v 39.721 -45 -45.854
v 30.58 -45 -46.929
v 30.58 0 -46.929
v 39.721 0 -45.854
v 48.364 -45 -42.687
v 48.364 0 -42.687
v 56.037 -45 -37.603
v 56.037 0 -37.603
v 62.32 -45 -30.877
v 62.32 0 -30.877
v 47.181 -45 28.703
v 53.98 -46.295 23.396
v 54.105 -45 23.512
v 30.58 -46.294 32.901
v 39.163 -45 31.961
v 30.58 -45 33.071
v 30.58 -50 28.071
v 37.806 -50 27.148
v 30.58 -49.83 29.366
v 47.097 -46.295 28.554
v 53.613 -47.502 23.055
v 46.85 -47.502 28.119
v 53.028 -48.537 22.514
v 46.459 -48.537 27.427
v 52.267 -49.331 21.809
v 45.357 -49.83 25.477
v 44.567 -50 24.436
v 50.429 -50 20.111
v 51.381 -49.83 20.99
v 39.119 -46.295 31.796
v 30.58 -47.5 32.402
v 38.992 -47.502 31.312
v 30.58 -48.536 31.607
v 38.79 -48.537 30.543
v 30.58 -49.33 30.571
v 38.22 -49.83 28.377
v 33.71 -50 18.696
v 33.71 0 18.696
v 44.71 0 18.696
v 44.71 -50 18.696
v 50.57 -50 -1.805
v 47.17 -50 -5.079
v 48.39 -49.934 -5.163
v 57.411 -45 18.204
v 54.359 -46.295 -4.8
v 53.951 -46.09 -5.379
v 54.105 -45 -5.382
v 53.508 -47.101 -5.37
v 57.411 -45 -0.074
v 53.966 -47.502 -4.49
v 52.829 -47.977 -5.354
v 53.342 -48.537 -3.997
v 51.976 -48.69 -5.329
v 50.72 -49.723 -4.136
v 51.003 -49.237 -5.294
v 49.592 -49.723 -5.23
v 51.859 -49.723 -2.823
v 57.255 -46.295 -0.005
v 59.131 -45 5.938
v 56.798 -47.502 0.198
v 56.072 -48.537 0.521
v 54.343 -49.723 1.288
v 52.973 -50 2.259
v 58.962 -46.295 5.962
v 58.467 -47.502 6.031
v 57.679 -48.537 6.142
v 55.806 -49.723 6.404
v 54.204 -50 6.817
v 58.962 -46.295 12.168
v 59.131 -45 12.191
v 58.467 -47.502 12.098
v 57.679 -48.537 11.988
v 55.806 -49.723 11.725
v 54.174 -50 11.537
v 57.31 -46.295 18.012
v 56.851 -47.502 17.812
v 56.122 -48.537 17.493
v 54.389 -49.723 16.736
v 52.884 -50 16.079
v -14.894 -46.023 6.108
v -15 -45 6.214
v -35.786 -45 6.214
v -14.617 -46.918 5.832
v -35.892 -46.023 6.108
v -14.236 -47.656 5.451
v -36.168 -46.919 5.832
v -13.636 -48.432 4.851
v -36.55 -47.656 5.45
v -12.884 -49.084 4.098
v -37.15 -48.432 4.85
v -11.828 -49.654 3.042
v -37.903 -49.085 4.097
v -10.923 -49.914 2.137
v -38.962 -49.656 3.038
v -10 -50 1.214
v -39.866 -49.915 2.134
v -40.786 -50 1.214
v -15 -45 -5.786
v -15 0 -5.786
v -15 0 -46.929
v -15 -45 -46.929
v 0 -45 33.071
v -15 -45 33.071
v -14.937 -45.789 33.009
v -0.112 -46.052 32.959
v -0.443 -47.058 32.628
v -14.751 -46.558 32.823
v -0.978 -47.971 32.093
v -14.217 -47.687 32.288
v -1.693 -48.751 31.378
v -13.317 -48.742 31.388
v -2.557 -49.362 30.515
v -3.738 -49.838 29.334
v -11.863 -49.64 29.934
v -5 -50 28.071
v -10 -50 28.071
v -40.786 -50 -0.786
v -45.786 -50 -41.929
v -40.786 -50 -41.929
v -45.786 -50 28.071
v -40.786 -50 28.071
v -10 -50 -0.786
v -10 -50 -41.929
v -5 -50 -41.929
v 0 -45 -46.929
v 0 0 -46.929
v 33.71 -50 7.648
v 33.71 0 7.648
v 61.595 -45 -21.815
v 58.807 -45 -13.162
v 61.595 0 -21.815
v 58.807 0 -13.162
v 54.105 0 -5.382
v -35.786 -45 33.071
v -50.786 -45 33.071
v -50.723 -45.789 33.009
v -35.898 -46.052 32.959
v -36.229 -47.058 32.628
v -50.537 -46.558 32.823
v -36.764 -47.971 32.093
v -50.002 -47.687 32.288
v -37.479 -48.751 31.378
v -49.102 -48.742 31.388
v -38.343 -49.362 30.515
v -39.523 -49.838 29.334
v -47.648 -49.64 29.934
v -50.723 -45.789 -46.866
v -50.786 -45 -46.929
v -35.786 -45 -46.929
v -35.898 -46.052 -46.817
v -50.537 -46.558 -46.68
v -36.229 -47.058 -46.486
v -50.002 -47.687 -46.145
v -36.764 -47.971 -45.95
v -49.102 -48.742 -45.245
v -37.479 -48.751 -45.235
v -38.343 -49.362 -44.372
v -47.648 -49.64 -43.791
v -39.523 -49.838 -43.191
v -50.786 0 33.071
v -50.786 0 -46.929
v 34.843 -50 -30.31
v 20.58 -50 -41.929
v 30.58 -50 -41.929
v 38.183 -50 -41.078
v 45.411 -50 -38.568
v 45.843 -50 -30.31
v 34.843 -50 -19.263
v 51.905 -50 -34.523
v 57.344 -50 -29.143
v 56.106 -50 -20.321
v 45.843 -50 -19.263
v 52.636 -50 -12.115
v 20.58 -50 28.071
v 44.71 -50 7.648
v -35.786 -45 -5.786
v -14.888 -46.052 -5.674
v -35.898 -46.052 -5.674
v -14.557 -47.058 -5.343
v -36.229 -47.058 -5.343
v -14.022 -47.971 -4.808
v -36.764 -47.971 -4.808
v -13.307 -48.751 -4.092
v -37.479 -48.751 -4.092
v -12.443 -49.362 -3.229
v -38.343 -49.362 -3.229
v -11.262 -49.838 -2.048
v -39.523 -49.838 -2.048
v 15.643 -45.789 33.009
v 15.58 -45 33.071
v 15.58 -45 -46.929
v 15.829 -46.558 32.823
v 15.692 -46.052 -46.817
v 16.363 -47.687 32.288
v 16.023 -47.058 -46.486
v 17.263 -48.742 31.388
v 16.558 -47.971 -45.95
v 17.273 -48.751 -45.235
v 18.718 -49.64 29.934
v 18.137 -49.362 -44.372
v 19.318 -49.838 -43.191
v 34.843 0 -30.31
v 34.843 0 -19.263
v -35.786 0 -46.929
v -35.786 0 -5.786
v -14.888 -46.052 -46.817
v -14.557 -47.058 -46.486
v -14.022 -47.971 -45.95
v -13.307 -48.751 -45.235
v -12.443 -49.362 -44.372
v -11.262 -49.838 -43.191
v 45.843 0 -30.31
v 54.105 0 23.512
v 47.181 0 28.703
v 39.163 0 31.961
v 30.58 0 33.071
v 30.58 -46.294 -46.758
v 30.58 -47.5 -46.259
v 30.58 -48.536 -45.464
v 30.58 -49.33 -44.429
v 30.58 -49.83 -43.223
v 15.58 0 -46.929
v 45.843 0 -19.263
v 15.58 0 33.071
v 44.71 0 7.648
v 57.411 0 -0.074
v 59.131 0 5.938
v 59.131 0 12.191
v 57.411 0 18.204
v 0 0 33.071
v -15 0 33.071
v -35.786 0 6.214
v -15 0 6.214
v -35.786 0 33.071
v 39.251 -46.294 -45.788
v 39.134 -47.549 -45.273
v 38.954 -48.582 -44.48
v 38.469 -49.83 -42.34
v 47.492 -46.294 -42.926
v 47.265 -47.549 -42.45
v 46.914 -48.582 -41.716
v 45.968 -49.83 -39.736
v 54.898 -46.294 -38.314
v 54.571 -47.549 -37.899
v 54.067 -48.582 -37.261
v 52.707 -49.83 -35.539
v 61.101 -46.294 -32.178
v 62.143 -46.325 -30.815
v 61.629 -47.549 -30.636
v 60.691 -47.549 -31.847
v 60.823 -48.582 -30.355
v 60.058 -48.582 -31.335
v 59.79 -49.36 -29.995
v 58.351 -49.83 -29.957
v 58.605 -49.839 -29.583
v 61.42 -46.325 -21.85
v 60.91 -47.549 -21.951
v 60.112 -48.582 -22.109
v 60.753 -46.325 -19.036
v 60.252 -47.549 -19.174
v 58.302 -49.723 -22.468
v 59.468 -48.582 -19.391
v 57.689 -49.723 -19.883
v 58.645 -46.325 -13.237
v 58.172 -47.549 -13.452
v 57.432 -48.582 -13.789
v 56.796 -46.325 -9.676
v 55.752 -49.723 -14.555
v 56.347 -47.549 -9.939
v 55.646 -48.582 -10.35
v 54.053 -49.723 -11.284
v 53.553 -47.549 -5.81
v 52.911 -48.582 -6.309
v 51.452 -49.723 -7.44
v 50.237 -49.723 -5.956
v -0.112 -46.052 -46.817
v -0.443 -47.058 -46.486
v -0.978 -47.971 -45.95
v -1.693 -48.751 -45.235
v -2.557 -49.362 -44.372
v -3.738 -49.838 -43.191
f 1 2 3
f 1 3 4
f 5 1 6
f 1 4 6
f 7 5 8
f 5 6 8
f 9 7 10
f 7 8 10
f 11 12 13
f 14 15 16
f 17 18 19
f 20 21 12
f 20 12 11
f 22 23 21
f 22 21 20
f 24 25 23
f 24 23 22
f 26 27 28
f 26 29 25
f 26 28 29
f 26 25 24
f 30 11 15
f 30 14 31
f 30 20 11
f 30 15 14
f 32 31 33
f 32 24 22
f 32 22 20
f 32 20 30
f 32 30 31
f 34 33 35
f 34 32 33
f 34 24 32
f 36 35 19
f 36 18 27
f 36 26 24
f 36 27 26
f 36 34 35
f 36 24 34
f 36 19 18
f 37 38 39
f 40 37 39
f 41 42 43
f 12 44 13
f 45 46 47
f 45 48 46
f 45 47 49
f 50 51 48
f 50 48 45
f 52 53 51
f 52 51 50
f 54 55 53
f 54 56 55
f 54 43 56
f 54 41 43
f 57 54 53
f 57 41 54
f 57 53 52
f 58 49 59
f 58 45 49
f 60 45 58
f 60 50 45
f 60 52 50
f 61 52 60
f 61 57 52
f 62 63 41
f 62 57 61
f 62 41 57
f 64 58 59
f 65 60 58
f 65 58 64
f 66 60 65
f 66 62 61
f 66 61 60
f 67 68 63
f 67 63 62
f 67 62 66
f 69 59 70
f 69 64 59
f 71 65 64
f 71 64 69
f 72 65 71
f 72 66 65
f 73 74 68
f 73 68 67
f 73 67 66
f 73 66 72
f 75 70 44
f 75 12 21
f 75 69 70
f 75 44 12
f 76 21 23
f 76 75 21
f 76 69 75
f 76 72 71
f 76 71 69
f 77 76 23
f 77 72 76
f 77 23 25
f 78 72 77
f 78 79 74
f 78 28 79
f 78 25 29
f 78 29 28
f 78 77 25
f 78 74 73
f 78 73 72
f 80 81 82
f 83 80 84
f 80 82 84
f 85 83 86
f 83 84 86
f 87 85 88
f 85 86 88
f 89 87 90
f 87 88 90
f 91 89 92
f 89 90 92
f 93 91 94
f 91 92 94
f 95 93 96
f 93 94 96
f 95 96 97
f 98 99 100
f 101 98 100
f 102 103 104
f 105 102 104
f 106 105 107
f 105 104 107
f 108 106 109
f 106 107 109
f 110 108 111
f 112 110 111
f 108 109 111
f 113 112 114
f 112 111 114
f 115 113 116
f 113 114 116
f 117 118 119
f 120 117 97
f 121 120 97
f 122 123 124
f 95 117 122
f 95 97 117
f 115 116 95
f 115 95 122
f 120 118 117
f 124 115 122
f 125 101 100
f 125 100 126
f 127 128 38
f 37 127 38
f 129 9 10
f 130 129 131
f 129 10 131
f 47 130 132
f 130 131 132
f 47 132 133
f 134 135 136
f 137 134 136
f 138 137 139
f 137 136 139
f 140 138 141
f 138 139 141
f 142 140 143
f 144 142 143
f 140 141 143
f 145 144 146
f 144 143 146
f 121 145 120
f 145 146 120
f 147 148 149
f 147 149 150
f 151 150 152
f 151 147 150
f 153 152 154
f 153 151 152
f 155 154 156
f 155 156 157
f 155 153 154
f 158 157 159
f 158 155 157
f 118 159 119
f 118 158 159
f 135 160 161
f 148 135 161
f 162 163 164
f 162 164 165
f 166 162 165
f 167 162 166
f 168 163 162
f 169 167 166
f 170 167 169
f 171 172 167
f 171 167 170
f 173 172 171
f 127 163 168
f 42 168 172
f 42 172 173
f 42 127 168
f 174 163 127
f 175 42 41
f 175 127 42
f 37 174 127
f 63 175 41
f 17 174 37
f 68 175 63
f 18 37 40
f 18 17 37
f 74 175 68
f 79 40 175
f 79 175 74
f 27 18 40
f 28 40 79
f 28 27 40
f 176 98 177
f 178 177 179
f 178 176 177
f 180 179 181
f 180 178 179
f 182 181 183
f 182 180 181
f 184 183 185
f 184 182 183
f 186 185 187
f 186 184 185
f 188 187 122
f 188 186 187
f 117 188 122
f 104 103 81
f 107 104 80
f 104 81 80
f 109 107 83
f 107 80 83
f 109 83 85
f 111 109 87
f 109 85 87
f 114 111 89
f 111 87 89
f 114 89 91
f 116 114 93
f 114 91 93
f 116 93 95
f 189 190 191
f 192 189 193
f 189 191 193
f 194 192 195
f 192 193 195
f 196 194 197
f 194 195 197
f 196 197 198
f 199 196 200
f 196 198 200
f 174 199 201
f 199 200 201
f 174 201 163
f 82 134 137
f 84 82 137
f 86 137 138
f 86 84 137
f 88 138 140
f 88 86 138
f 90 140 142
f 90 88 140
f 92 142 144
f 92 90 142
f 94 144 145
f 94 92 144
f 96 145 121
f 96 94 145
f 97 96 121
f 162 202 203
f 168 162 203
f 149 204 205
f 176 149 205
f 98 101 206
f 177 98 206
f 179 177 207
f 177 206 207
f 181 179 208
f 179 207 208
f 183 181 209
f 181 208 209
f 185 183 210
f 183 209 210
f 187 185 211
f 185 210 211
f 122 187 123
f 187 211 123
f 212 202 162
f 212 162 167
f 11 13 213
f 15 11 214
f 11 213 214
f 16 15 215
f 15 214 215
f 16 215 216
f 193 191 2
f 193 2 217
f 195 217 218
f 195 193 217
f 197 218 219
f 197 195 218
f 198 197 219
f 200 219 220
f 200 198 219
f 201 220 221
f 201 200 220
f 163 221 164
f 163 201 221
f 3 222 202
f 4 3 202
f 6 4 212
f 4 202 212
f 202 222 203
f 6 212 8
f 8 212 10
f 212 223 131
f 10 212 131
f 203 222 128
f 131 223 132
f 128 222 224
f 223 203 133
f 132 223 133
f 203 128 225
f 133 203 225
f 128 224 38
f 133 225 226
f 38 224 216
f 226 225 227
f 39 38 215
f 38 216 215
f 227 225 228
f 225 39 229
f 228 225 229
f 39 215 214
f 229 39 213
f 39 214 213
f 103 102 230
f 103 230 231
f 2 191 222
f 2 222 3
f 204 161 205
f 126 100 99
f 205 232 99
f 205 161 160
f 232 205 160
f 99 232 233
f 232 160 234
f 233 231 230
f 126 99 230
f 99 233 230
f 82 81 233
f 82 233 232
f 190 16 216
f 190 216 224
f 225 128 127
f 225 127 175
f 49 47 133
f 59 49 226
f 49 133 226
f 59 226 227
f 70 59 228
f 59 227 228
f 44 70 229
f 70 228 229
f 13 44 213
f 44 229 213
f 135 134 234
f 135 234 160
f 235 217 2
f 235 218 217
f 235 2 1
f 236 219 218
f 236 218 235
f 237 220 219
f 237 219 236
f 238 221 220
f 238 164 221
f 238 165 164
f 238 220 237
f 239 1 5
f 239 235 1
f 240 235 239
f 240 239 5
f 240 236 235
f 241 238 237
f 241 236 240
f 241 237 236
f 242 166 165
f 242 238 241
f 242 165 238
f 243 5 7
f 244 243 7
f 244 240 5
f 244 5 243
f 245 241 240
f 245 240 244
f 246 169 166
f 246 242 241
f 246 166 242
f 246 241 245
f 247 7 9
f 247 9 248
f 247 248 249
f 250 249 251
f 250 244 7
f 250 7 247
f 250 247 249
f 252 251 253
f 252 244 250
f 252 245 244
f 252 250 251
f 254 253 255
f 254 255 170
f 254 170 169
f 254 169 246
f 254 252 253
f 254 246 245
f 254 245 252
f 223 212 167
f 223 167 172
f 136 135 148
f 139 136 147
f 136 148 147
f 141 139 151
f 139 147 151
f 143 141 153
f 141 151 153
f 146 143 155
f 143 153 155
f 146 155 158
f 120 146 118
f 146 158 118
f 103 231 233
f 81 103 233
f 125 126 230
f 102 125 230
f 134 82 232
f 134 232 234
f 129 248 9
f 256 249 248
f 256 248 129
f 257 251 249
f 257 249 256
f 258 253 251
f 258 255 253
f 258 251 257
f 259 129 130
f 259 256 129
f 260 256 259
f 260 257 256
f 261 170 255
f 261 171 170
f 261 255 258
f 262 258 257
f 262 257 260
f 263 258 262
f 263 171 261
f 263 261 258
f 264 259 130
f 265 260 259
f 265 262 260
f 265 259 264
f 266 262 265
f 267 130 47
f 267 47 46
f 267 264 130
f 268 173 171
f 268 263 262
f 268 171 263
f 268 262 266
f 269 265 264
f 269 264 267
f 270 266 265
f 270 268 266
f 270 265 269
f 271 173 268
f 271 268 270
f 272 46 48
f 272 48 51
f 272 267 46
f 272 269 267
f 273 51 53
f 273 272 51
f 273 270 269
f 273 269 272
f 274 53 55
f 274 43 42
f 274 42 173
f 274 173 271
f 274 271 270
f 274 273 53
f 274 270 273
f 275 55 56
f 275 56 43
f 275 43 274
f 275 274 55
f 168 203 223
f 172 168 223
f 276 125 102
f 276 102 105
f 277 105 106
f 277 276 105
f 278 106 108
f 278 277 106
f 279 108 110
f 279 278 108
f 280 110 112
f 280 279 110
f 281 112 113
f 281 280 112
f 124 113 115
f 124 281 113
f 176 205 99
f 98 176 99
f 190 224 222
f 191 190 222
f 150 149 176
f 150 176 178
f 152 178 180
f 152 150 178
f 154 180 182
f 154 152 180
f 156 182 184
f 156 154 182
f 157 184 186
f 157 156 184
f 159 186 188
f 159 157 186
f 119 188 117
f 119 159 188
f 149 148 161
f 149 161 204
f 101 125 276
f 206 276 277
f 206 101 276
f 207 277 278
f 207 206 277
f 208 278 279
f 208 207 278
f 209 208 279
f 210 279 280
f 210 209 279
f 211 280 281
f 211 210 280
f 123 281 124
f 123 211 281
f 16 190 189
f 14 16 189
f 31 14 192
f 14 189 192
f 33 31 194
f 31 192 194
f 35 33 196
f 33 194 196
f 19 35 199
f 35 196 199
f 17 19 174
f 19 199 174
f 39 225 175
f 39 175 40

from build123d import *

# Parameters (mm, degrees)
F1_DEPTH       = 50
F0_W           = 11
F0_H           = 11.0476613045
F0_H_2         = 11.0476617701
F2_T1_DEPTH    = 105
F2_T3_DEPTH    = 40
F2_T5_DEPTH    = 39.3571444373
F2_T7_DEPTH    = 40
F2_T9_DEPTH    = 53.6428555627
F2_T11_DEPTH   = 20.7857115482
F2_T16_DEPTH   = 51.8571444373
F2_T21_DEPTH   = 66.1428555627
F2_T26_DEPTH   = 66.1428555627
F2_T31_DEPTH   = 51.8571444373
F2_T37_DEPTH   = 51.8571444373
F2_T42_DEPTH   = 33.2857115482
F2_T49_DEPTH   = 66.1428555627
F2_T54_DEPTH   = 33.2857115482
F2_T61_DEPTH   = 33.2857115482
F2_T65_DEPTH   = 66.1428555627
F2_T73_DEPTH   = 51.8571444373
F2_T78_DEPTH   = 33.2857115482
F2_2_T1_DEPTH  = 27.5
F2_2_T3_DEPTH  = 105
F2_2_T6_ANGLE  = 80.3342530923
F2_2_T10_ANGLE = 143.4118786012
F2_2_S11_R     = 39.2893999544
F2_2_T12_DEPTH = 27
F2_2_T16_ANGLE = 76.3206243735
F2_2_S17_R     = 22.5233307718
F2_2_T18_DEPTH = 29
F2_2_T20_ANGLE = 71.8308511896
F2_2_T25_ANGLE = 76.3206243735
F2_2_S26_R     = 22.5233307718
F2_2_T27_DEPTH = 29
F2_2_T30_ANGLE = 143.4118786012
F2_2_S31_R     = 39.2893999544
F2_2_T32_DEPTH = 27


# Not quite as in the source:
# - a fillet or chamfer that OpenCascade refuses, or shapes differently, is made with other operations: its cross-section is extruded or revolved along the edge and cut away or added


with BuildPart() as f1:
    # F0 (on Front) → F1 (new body)
    with BuildSketch(Plane.XZ):
        Polygon((-35.7857115482, 33.0714304233), (-50.7857115482, 33.0714304233), (-50.7857115482, -46.9285695767), (-35.7857115482, -46.9285695767), (-35.7857115482, -5.785714014), (-15, -5.785714014), (-15, -46.9285695767), (0, -46.9285695767), (0, 33.0714304233), (-15, 33.0714304233), (-15, 6.214285986), (-35.7857115482, 6.214285986), align=None)
    extrude(amount=F1_DEPTH)

    # F2: fillet of radius 5 on 12 edges, made by hand

    # F2_s2 → F2_t1 (cut)
    with BuildSketch(Plane.XY.offset(-59.4285695767)):
        with BuildLine():
            ThreePointArc((0, -45), (-1.4644660941, -48.5355339059), (-5, -50))
            Line((-5, -50), (0, -50))
            Line((0, -50), (0, -45))
        make_face()
        with BuildLine():
            ThreePointArc((-50.7857115482, -45), (-49.3212454541, -48.5355339059), (-45.7857115482, -50))
            Line((-45.7857115482, -50), (-50.7857115482, -50))
            Line((-50.7857115482, -50), (-50.7857115482, -45))
        make_face()
    extrude(amount=F2_T1_DEPTH, mode=Mode.SUBTRACT)

    # F2_s4 → F2_t3 (cut)
    with BuildSketch(Plane.YZ.offset(-27.5)):
        with BuildLine():
            ThreePointArc((-45, 33.0714304233), (-48.5355339059, 31.6069643292), (-50, 28.0714304233))
            Line((-50, 28.0714304233), (-50, 33.0714304233))
            Line((-50, 33.0714304233), (-45, 33.0714304233))
        make_face()
        with BuildLine():
            ThreePointArc((-45, -46.9285695767), (-48.5355339059, -45.4641034826), (-50, -41.9285695767))
            Line((-50, -41.9285695767), (-50, -46.9285695767))
            Line((-50, -46.9285695767), (-45, -46.9285695767))
        make_face()
    extrude(amount=F2_T3_DEPTH, mode=Mode.SUBTRACT)

    # F2_s6 → F2_t5 (cut)
    with BuildSketch(Plane.XY.offset(6.214285986)):
        with BuildLine():
            ThreePointArc((-35.7857115482, -45), (-37.2501776423, -48.5355339059), (-40.7857115482, -50))
            Line((-40.7857115482, -50), (-35.7857115482, -50))
            Line((-35.7857115482, -50), (-35.7857115482, -45))
        make_face()
        with BuildLine():
            ThreePointArc((-15, -45), (-13.5355339059, -48.5355339059), (-10, -50))
            Line((-10, -50), (-15, -50))
            Line((-15, -50), (-15, -45))
        make_face()
    extrude(amount=F2_T5_DEPTH, mode=Mode.SUBTRACT)

    # F2_s8 → F2_t7 (cut)
    with BuildSketch(Plane.YZ.offset(-63.2857115482)):
        with BuildLine():
            ThreePointArc((-45, 33.0714304233), (-48.5355339059, 31.6069643292), (-50, 28.0714304233))
            Line((-50, 28.0714304233), (-50, 33.0714304233))
            Line((-50, 33.0714304233), (-45, 33.0714304233))
        make_face()
        with BuildLine():
            ThreePointArc((-45, -46.9285695767), (-48.5355339059, -45.4641034826), (-50, -41.9285695767))
            Line((-50, -41.9285695767), (-50, -46.9285695767))
            Line((-50, -46.9285695767), (-45, -46.9285695767))
        make_face()
    extrude(amount=F2_T7_DEPTH, mode=Mode.SUBTRACT)

    # F2_s10 → F2_t9 (cut)
    with BuildSketch(Plane.XY.offset(-59.4285695767)):
        with BuildLine():
            ThreePointArc((-35.7857115482, -45), (-37.2501776423, -48.5355339059), (-40.7857115482, -50))
            Line((-40.7857115482, -50), (-35.7857115482, -50))
            Line((-35.7857115482, -50), (-35.7857115482, -45))
        make_face()
        with BuildLine():
            ThreePointArc((-15, -45), (-13.5355339059, -48.5355339059), (-10, -50))
            Line((-10, -50), (-15, -50))
            Line((-15, -50), (-15, -45))
        make_face()
    extrude(amount=F2_T9_DEPTH, mode=Mode.SUBTRACT)

    # F2_s12 → F2_t11 (cut)
    with BuildSketch(Plane.YZ.offset(-35.7857115482)):
        with BuildLine():
            ThreePointArc((-45, -5.785714014), (-48.5355339059, -4.3212479199), (-50, -0.785714014))
            Line((-50, -0.785714014), (-50, -5.785714014))
            Line((-50, -5.785714014), (-45, -5.785714014))
        make_face()
        with BuildLine():
            ThreePointArc((-45, 6.214285986), (-48.5355339059, 4.749819892), (-50, 1.214285986))
            Line((-50, 1.214285986), (-50, 6.214285986))
            Line((-50, 6.214285986), (-45, 6.214285986))
        make_face()
    extrude(amount=F2_T11_DEPTH, mode=Mode.SUBTRACT)


with BuildPart() as f1b:
    # F0 (on Front) → F1, piece 2 (new body)
    with BuildSketch(Plane.XZ):
        with BuildLine():
            Line((30.5800376087, 33.0714304233), (15.5800376087, 33.0714304233))
            Line((15.5800376087, 33.0714304233), (15.5800376087, -46.9285695767))
            Line((15.5800376087, -46.9285695767), (30.5800376087, -46.9285695767))
            ThreePointArc((30.5800376087, -46.9285695767), (48.3641167152, -42.6873971764), (62.3201467097, -30.8767985553))
            ThreePointArc((62.3201467097, -30.8767985553), (60.4523586567, -17.4078220357), (54.1052147746, -5.3821941838))
            ThreePointArc((54.1052147746, -5.3821941838), (59.3488970656, 9.0647493489), (54.1052147746, 23.5116928816))
            ThreePointArc((54.1052147746, 23.5116928816), (43.2767157427, 30.5902254056), (30.5800376087, 33.0714304233))
        make_face()
        with Locations((40.3426289856, -24.7864220291)):
            Rectangle(F0_W, F0_H, mode=Mode.SUBTRACT)
        with Locations((39.2095372379, 13.1722127553)):
            Rectangle(F0_W, F0_H_2, mode=Mode.SUBTRACT)
    extrude(amount=F1_DEPTH)

    # F2#2: fillet of radius 5 on 7 edges, made by hand

    # F2_2_s2 → F2_2_t1 (cut)
    with BuildSketch(Plane.YZ.offset(3.0800376087)):
        with BuildLine():
            ThreePointArc((-45, -46.9285695767), (-48.5355339059, -45.4641034826), (-50, -41.9285695767))
            Line((-50, -41.9285695767), (-50, -46.9285695767))
            Line((-50, -46.9285695767), (-45, -46.9285695767))
        make_face()
        with BuildLine():
            ThreePointArc((-45, 33.0714304233), (-48.5355339059, 31.6069643292), (-50, 28.0714304233))
            Line((-50, 28.0714304233), (-50, 33.0714304233))
            Line((-50, 33.0714304233), (-45, 33.0714304233))
        make_face()
    extrude(amount=F2_2_T1_DEPTH, mode=Mode.SUBTRACT)

    # F2_2_s4 → F2_2_t3 (cut)
    with BuildSketch(Plane.XY.offset(-59.4285695767)):
        with BuildLine():
            ThreePointArc((15.5800376087, -45), (17.0445037028, -48.5355339059), (20.5800376087, -50))
            Line((20.5800376087, -50), (15.5800376087, -50))
            Line((15.5800376087, -50), (15.5800376087, -45))
        make_face()
    extrude(amount=F2_2_T3_DEPTH, mode=Mode.SUBTRACT)

    # F2_2_s5 → F2_2_t6 (revolve, cut)
    with BuildSketch(Plane(origin=(0.9703990257, 0, -5.6975752164), x_dir=(0, 1, 0), z_dir=(0.1679000671, 0, -0.9858040208))):
        with BuildLine():
            ThreePointArc((-45, 63.7619837133), (-48.5355339059, 62.2975176192), (-50, 58.7619837133))
            Line((-50, 58.7619837133), (-50, 63.7619837133))
            Line((-50, 63.7619837133), (-45, 63.7619837133))
        make_face()
    revolve(axis=Axis((30.5800376087, -50, -0.6545238583), (0, -1, 0)), revolution_arc=F2_2_T6_ANGLE, mode=Mode.SUBTRACT)


with BuildPart() as f2_tool14:
    # F2_s15 → F2_t16 (new body)
    with BuildSketch(Plane.XY.offset(-6.285714014)):
        with BuildLine():
            ThreePointArc((-35.7857115482, -45), (-37.2501776423, -48.5355339059), (-40.7857115482, -50))
            Line((-40.7857115482, -50), (-35.7857115482, -50))
            Line((-35.7857115482, -50), (-35.7857115482, -45))
        make_face()
    extrude(amount=F2_T16_DEPTH)

    split(bisect_by=Plane.XY.offset(-5.785714014), keep=Keep.BOTTOM)


with BuildPart() as f1_1:
    add(f1.part)

    # F2_t13: cut F2_tool14
    add(f2_tool14.part, mode=Mode.SUBTRACT)


with BuildPart() as f2_tool19:
    # F2_s20 → F2_t21 (new body)
    with BuildSketch(Plane.XY.offset(-59.4285695767)):
        with BuildLine():
            ThreePointArc((-35.7857115482, -45), (-37.2501776423, -48.5355339059), (-40.7857115482, -50))
            Line((-40.7857115482, -50), (-35.7857115482, -50))
            Line((-35.7857115482, -50), (-35.7857115482, -45))
        make_face()
    extrude(amount=F2_T21_DEPTH)

    split(bisect_by=Plane.XY.offset(6.214285986), keep=Keep.TOP)


with BuildPart() as f1_2:
    add(f1_1.part)

    # F2_t18: cut F2_tool19
    add(f2_tool19.part, mode=Mode.SUBTRACT)


with BuildPart() as f2_tool24:
    # F2_s25 → F2_t26 (new body)
    with BuildSketch(Plane.XY.offset(6.714285986)):
        with BuildLine():
            ThreePointArc((-15, -45), (-13.5355339059, -48.5355339059), (-10, -50))
            Line((-10, -50), (-15, -50))
            Line((-15, -50), (-15, -45))
        make_face()
    extrude(amount=-F2_T26_DEPTH)

    split(bisect_by=Plane.XY.offset(6.214285986), keep=Keep.TOP)


with BuildPart() as f1_3:
    add(f1_2.part)

    # F2_t23: cut F2_tool24
    add(f2_tool24.part, mode=Mode.SUBTRACT)


with BuildPart() as f2_tool29:
    # F2_s30 → F2_t31 (new body)
    with BuildSketch(Plane.XY.offset(45.5714304233)):
        with BuildLine():
            ThreePointArc((-15, -45), (-13.5355339059, -48.5355339059), (-10, -50))
            Line((-10, -50), (-15, -50))
            Line((-15, -50), (-15, -45))
        make_face()
    extrude(amount=-F2_T31_DEPTH)

    split(bisect_by=Plane.XY.offset(-5.785714014), keep=Keep.BOTTOM)


with BuildPart() as f1_4:
    add(f1_3.part)

    # F2_t28: cut F2_tool29
    add(f2_tool29.part, mode=Mode.SUBTRACT)


with BuildPart() as f2_tool35:
    # F2_s36 → F2_t37 (new body)
    with BuildSketch(Plane.XY.offset(-6.285714014)):
        with BuildLine():
            ThreePointArc((-35.7857115482, -45), (-37.2501776423, -48.5355339059), (-40.7857115482, -50))
            Line((-40.7857115482, -50), (-35.7857115482, -50))
            Line((-35.7857115482, -50), (-35.7857115482, -45))
        make_face()
    extrude(amount=F2_T37_DEPTH)

    split(bisect_by=Plane.XY.offset(6.214285986), keep=Keep.BOTTOM)

    split(bisect_by=Plane.XY.offset(-5.785714014), keep=Keep.TOP)


with BuildPart() as f2_tool40:
    # F2_s41 → F2_t42 (new body)
    with BuildSketch(Plane.YZ.offset(-15)):
        with BuildLine():
            ThreePointArc((-45, 6.214285986), (-48.5355339059, 4.749819892), (-50, 1.214285986))
            Line((-50, 1.214285986), (-50, 6.214285986))
            Line((-50, 6.214285986), (-45, 6.214285986))
        make_face()
    extrude(amount=-F2_T42_DEPTH)

    split(bisect_by=Plane.YZ.offset(-35.7857115482), keep=Keep.BOTTOM)


with BuildPart() as f2_tool35_1:
    add(f2_tool35.part)

    # F2_t44: intersect F2_tool40
    add(f2_tool40.part, mode=Mode.INTERSECT)


with BuildPart() as f1_5:
    add(f1_4.part)

    # F2_t33: cut F2_tool35
    add(f2_tool35_1.part, mode=Mode.SUBTRACT)


with BuildPart() as f2_tool47:
    # F2_s48 → F2_t49 (new body)
    with BuildSketch(Plane.XY.offset(-59.4285695767)):
        with BuildLine():
            ThreePointArc((-35.7857115482, -45), (-37.2501776423, -48.5355339059), (-40.7857115482, -50))
            Line((-40.7857115482, -50), (-35.7857115482, -50))
            Line((-35.7857115482, -50), (-35.7857115482, -45))
        make_face()
    extrude(amount=F2_T49_DEPTH)

    split(bisect_by=Plane.XY.offset(6.214285986), keep=Keep.BOTTOM)

    split(bisect_by=Plane.XY.offset(-5.785714014), keep=Keep.TOP)


with BuildPart() as f2_tool52:
    # F2_s53 → F2_t54 (new body)
    with BuildSketch(Plane.YZ.offset(-48.2857115482)):
        with BuildLine():
            ThreePointArc((-45, -5.785714014), (-48.5355339059, -4.3212479199), (-50, -0.785714014))
            Line((-50, -0.785714014), (-50, -5.785714014))
            Line((-50, -5.785714014), (-45, -5.785714014))
        make_face()
    extrude(amount=F2_T54_DEPTH)

    split(bisect_by=Plane.YZ.offset(-35.7857115482), keep=Keep.BOTTOM)


with BuildPart() as f2_tool47_1:
    add(f2_tool47.part)

    # F2_t56: intersect F2_tool52
    add(f2_tool52.part, mode=Mode.INTERSECT)


with BuildPart() as f1_6:
    add(f1_5.part)

    # F2_t45: cut F2_tool47
    add(f2_tool47_1.part, mode=Mode.SUBTRACT)


with BuildPart() as f2_tool59:
    # F2_s60 → F2_t61 (new body)
    with BuildSketch(Plane.YZ.offset(-35.7857115482)):
        with BuildLine():
            ThreePointArc((-45, -5.785714014), (-48.5355339059, -4.3212479199), (-50, -0.785714014))
            Line((-50, -0.785714014), (-50, -5.785714014))
            Line((-50, -5.785714014), (-45, -5.785714014))
        make_face()
    extrude(amount=F2_T61_DEPTH)

    split(bisect_by=Plane.YZ.offset(-15), keep=Keep.TOP)


with BuildPart() as f2_tool63:
    # F2_s64 → F2_t65 (new body)
    with BuildSketch(Plane.XY.offset(6.714285986)):
        with BuildLine():
            ThreePointArc((-15, -45), (-13.5355339059, -48.5355339059), (-10, -50))
            Line((-10, -50), (-15, -50))
            Line((-15, -50), (-15, -45))
        make_face()
    extrude(amount=-F2_T65_DEPTH)

    split(bisect_by=Plane.XY.offset(-5.785714014), keep=Keep.TOP)

    split(bisect_by=Plane.XY.offset(6.214285986), keep=Keep.BOTTOM)


with BuildPart() as f2_tool59_1:
    add(f2_tool59.part)

    # F2_t68: intersect F2_tool63
    add(f2_tool63.part, mode=Mode.INTERSECT)


with BuildPart() as f1_7:
    add(f1_6.part)

    # F2_t57: cut F2_tool59
    add(f2_tool59_1.part, mode=Mode.SUBTRACT)


with BuildPart() as f2_tool71:
    # F2_s72 → F2_t73 (new body)
    with BuildSketch(Plane.XY.offset(45.5714304233)):
        with BuildLine():
            ThreePointArc((-15, -45), (-13.5355339059, -48.5355339059), (-10, -50))
            Line((-10, -50), (-15, -50))
            Line((-15, -50), (-15, -45))
        make_face()
    extrude(amount=-F2_T73_DEPTH)

    split(bisect_by=Plane.XY.offset(-5.785714014), keep=Keep.TOP)

    split(bisect_by=Plane.XY.offset(6.214285986), keep=Keep.BOTTOM)


with BuildPart() as f2_tool76:
    # F2_s77 → F2_t78 (new body)
    with BuildSketch(Plane.YZ.offset(-2.5)):
        with BuildLine():
            ThreePointArc((-45, 6.214285986), (-48.5355339059, 4.749819892), (-50, 1.214285986))
            Line((-50, 1.214285986), (-50, 6.214285986))
            Line((-50, 6.214285986), (-45, 6.214285986))
        make_face()
    extrude(amount=-F2_T78_DEPTH)

    split(bisect_by=Plane.YZ.offset(-15), keep=Keep.TOP)


with BuildPart() as f2_tool71_1:
    add(f2_tool71.part)

    # F2_t80: intersect F2_tool76
    add(f2_tool76.part, mode=Mode.INTERSECT)


with BuildPart() as f1_8:
    add(f1_7.part)

    # F2_t69: cut F2_tool71
    add(f2_tool71_1.part, mode=Mode.SUBTRACT)


with BuildPart() as f2_2_tool8:
    # F2_2_s9 → F2_2_t10 (revolve)
    with BuildSketch(Plane(origin=(35.8987230001, 0, 11.8682393716), x_dir=(0, 1, 0), z_dir=(-0.9494580211, 0, -0.3138940365))):
        with BuildLine():
            ThreePointArc((-45, 25.4760574436), (-48.5355339059, 24.0115913495), (-50, 20.4760574436))
            Line((-50, 20.4760574436), (-50, 25.4760574436))
            Line((-50, 25.4760574436), (-45, 25.4760574436))
        make_face()
    revolve(axis=Axis((36.8255662938, -50, 9.0647493489), (0, -1, 0)), revolution_arc=F2_2_T10_ANGLE)

    # F2_2_s11 → F2_2_t12 (cut, symmetric)
    with BuildSketch(Plane.XZ.offset(47.5)):
        with Locations((23.056385538, -29.4576412578)):
            Circle(F2_2_S11_R)
    extrude(amount=F2_2_T12_DEPTH, both=True, mode=Mode.SUBTRACT)


with BuildPart() as f1b_1:
    add(f1b.part)

    # F2_2_t7: cut F2_2_tool8
    add(f2_2_tool8.part, mode=Mode.SUBTRACT)


with BuildPart() as f2_2_tool14:
    # F2_2_s15 → F2_2_t16 (revolve)
    with BuildSketch(Plane(origin=(-6.8099969571, 0, -18.4096063069), x_dir=(0, 1, 0), z_dir=(-0.3469390933, 0, -0.9378876615))):
        with BuildLine():
            ThreePointArc((-45, 71.133706818), (-48.5355339059, 69.669240724), (-50, 66.133706818))
            Line((-50, 66.133706818), (-50, 71.133706818))
            Line((-50, 71.133706818), (-45, 71.133706818))
        make_face()
    revolve(axis=Axis((23.056385538, -50, -29.4576412578), (0, -1, 0)), revolution_arc=F2_2_T16_ANGLE)

    # F2_2_s17 → F2_2_t18 (cut, symmetric)
    with BuildSketch(Plane.XZ.offset(47.5)):
        with Locations((36.8255662938, 9.0647493489)):
            Circle(F2_2_S17_R)
    extrude(amount=F2_2_T18_DEPTH, both=True, mode=Mode.SUBTRACT)


with BuildPart() as f1b_2:
    add(f1b_1.part)

    # F2_2_t13: cut F2_2_tool14
    add(f2_2_tool14.part, mode=Mode.SUBTRACT)

    # F2_2_s19 → F2_2_t20 (revolve, cut)
    with BuildSketch(Plane.YZ.offset(30.5800376087)):
        with BuildLine():
            ThreePointArc((-45, -46.9285695767), (-48.5355339059, -45.4641034826), (-50, -41.9285695767))
            Line((-50, -41.9285695767), (-50, -46.9285695767))
            Line((-50, -46.9285695767), (-45, -46.9285695767))
        make_face()
    revolve(axis=Axis((30.5800376087, -50, -7.5218936101), (0, -1, 0)), revolution_arc=F2_2_T20_ANGLE, mode=Mode.SUBTRACT)


with BuildPart() as f2_2_tool23:
    # F2_2_s24 → F2_2_t25 (revolve)
    with BuildSketch(Plane(origin=(-6.8099969571, 0, -18.4096063069), x_dir=(0, 1, 0), z_dir=(-0.3469390933, 0, -0.9378876615))):
        with BuildLine():
            ThreePointArc((-45, 71.133706818), (-48.5355339059, 69.669240724), (-50, 66.133706818))
            Line((-50, 66.133706818), (-50, 71.133706818))
            Line((-50, 71.133706818), (-45, 71.133706818))
        make_face()
    revolve(axis=Axis((23.056385538, -50, -29.4576412578), (0, -1, 0)), revolution_arc=F2_2_T25_ANGLE)

    # F2_2_s26 → F2_2_t27 (intersect, symmetric)
    with BuildSketch(Plane.XZ.offset(47.5)):
        with Locations((36.8255662938, 9.0647493489)):
            Circle(F2_2_S26_R)
    extrude(amount=F2_2_T27_DEPTH, both=True, mode=Mode.INTERSECT)


with BuildPart() as f2_2_tool28:
    # F2_2_s29 → F2_2_t30 (revolve)
    with BuildSketch(Plane(origin=(35.8987230001, 0, 11.8682393716), x_dir=(0, 1, 0), z_dir=(-0.9494580211, 0, -0.3138940365))):
        with BuildLine():
            ThreePointArc((-45, 25.4760574436), (-48.5355339059, 24.0115913495), (-50, 20.4760574436))
            Line((-50, 20.4760574436), (-50, 25.4760574436))
            Line((-50, 25.4760574436), (-45, 25.4760574436))
        make_face()
    revolve(axis=Axis((36.8255662938, -50, 9.0647493489), (0, -1, 0)), revolution_arc=F2_2_T30_ANGLE)

    # F2_2_s31 → F2_2_t32 (intersect, symmetric)
    with BuildSketch(Plane.XZ.offset(47.5)):
        with Locations((23.056385538, -29.4576412578)):
            Circle(F2_2_S31_R)
    extrude(amount=F2_2_T32_DEPTH, both=True, mode=Mode.INTERSECT)


with BuildPart() as f2_2_tool23_1:
    add(f2_2_tool23.part)

    # F2_2_t33: intersect F2_2_tool28
    add(f2_2_tool28.part, mode=Mode.INTERSECT)


with BuildPart() as f1b_3:
    add(f1b_2.part)

    # F2_2_t21: cut F2_2_tool23
    add(f2_2_tool23_1.part, mode=Mode.SUBTRACT)


solid = Compound([f1_8.part, f1b_3.part])
